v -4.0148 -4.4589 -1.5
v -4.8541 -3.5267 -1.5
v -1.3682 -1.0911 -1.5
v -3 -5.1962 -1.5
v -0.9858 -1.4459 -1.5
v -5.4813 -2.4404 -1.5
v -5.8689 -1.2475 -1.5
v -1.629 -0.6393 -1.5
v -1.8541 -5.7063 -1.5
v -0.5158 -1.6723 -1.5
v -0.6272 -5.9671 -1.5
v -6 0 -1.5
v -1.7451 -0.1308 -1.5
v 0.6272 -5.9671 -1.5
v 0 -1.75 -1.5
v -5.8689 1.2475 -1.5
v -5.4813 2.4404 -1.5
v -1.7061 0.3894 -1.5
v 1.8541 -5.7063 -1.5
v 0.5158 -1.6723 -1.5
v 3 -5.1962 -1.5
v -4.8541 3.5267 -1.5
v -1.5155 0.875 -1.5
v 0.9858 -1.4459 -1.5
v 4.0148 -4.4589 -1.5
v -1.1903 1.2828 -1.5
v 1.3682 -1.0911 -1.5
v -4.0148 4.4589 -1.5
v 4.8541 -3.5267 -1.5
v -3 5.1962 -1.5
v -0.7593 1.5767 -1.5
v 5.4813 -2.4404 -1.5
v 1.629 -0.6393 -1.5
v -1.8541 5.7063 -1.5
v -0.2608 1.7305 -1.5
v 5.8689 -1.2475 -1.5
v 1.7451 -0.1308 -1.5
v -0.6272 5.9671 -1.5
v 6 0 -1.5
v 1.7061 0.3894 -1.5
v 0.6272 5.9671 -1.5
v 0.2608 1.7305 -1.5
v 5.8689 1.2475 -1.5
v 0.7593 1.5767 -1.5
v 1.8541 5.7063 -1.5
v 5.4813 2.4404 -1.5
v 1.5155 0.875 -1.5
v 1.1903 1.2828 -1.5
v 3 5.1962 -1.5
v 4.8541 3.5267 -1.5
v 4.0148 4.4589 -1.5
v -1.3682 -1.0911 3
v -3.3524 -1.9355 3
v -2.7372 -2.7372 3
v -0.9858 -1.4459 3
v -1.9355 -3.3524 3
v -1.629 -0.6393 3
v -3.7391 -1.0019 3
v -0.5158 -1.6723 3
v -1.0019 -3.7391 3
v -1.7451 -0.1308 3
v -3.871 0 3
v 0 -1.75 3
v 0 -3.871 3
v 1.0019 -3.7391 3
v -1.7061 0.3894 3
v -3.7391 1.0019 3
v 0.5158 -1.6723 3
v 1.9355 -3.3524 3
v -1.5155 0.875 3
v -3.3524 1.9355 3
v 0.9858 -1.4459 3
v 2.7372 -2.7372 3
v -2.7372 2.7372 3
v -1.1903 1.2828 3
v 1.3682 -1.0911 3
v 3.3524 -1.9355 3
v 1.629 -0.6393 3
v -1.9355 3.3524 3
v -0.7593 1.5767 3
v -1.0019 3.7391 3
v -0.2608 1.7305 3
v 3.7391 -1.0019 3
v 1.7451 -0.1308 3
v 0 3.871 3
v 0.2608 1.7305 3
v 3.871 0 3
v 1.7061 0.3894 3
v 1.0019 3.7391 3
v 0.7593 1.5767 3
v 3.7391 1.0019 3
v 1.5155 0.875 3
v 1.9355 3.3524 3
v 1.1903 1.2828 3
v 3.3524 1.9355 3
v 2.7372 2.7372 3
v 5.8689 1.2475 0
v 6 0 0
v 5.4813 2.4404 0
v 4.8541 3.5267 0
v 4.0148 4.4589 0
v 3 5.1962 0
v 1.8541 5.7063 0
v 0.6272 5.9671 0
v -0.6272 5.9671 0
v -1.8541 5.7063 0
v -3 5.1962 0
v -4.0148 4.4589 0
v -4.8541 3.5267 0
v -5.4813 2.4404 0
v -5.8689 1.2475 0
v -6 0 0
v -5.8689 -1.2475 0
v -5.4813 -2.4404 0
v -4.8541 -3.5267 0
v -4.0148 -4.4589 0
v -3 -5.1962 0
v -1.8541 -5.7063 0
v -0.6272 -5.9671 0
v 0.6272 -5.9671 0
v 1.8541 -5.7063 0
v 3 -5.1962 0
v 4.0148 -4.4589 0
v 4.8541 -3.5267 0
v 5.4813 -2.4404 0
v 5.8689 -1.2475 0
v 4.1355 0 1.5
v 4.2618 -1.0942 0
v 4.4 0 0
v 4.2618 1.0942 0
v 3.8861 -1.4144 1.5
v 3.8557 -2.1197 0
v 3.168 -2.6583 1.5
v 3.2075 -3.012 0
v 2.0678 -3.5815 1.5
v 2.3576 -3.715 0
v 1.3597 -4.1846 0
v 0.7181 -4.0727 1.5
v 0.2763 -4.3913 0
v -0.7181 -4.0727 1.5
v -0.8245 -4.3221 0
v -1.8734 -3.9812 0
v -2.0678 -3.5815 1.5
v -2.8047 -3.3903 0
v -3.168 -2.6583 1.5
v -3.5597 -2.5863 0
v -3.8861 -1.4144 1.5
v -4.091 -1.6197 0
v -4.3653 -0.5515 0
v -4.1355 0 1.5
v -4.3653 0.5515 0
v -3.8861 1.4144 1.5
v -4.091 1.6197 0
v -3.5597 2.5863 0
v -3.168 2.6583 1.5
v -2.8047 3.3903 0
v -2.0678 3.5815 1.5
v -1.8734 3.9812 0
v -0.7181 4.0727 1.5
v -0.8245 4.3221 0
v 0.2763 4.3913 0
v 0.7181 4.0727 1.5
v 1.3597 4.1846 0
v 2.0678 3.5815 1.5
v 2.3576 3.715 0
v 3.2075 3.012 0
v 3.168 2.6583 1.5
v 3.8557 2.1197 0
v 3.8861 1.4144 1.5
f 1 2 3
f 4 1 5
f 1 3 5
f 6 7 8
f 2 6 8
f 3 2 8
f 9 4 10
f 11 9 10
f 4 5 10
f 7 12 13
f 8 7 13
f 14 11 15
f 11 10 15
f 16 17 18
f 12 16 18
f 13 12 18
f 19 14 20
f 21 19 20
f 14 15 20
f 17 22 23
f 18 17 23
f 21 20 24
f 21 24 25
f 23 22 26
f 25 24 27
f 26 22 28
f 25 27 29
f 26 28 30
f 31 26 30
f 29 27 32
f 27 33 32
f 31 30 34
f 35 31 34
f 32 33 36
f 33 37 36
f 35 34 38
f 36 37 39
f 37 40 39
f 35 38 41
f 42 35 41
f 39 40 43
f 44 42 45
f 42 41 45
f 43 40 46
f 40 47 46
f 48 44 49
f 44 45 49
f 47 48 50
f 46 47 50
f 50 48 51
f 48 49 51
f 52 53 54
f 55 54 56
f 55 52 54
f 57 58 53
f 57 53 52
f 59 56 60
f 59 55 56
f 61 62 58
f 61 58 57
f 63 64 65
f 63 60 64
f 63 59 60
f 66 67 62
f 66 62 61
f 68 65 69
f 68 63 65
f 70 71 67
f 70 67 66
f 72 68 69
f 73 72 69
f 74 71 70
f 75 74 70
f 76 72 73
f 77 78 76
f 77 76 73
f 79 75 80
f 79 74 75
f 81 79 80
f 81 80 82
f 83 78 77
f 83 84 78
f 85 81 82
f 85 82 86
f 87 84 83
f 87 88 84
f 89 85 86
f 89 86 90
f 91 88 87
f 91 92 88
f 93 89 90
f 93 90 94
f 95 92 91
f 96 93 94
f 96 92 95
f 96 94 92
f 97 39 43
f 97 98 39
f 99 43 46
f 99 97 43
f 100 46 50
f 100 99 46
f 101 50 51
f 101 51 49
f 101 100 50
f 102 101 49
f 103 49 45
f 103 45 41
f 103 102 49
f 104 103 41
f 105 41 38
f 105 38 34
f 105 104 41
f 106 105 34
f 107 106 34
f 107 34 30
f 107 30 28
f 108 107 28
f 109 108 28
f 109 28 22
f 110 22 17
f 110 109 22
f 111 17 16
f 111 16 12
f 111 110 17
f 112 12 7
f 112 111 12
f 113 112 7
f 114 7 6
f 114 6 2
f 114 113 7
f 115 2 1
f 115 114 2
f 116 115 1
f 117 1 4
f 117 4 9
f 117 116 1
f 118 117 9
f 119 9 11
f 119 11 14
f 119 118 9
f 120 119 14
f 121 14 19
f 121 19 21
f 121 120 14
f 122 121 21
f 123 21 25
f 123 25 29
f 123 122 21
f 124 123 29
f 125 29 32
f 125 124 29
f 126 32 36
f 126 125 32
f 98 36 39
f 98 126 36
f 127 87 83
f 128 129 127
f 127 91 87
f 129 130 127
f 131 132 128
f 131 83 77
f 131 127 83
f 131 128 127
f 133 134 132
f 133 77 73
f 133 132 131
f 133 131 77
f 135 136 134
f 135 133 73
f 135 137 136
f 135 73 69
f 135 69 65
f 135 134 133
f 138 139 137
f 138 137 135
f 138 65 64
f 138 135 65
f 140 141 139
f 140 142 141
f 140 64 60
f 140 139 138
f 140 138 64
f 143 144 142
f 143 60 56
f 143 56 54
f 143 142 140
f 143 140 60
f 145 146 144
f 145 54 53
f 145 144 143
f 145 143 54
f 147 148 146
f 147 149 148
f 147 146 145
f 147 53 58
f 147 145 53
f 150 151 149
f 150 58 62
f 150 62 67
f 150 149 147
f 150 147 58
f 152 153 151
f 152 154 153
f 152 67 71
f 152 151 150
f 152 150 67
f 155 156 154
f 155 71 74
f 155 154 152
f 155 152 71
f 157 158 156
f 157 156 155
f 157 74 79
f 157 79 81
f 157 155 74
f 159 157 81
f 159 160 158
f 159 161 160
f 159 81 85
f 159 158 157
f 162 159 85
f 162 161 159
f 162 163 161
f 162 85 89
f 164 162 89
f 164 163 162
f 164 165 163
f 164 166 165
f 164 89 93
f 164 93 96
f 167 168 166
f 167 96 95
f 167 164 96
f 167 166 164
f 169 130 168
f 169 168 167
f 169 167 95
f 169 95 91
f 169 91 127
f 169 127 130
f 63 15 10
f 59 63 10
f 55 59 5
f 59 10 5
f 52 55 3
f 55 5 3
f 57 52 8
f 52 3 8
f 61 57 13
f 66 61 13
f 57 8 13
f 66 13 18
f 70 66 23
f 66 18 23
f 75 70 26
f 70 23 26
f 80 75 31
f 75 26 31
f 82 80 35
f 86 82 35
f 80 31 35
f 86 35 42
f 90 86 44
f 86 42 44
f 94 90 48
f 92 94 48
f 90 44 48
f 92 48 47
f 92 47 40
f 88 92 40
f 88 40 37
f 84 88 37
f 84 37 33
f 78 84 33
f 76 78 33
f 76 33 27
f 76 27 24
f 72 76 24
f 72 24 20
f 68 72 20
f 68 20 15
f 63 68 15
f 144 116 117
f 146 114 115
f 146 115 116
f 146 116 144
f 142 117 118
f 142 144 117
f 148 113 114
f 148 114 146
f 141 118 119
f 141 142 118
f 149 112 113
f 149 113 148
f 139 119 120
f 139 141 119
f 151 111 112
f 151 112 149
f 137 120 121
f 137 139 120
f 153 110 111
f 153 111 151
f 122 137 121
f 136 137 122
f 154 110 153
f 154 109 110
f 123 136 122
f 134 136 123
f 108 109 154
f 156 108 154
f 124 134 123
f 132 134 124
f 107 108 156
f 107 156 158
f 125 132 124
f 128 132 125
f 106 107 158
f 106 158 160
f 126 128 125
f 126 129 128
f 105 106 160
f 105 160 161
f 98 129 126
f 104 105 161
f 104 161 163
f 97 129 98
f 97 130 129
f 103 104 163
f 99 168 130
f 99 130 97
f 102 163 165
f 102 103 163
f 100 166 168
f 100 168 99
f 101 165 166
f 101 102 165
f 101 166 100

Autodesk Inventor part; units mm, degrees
ref_plane "YZ Plane" through (0, 0, 0) normal (1, 0, 0) x (0, 1, 0)
ref_plane "XZ Plane" through (0, 0, 0) normal (0, 1, 0) x (-1, 0, 0)
ref_plane "XY Plane" through (0, 0, 0) normal (0, 0, 1) x (1, 0, 0)
sketch "Sketch1" plane through (0, 0, 0) normal (0, 0, 1) x (1, 0, 0)
  circle A0 centre (0, 0) radius 6
  circle A1 centre (0, 0) radius 4.4
  dimension "d0" = 12
  dimension "d1" = 8.8
extrude "Extrusion1" add sketch "Sketch1" against normal blind 1.5 contours A0 | A1
extrude "Extrusion2" add sketch "Sketch1" along normal blind 3 draft -10 contours A1
hole "Hole1" at (0, 0, 3) direction (0, 0, -1) diameter 3.5 end through all
properties part number "segment1_coupler1" material "ABS Plastic"
